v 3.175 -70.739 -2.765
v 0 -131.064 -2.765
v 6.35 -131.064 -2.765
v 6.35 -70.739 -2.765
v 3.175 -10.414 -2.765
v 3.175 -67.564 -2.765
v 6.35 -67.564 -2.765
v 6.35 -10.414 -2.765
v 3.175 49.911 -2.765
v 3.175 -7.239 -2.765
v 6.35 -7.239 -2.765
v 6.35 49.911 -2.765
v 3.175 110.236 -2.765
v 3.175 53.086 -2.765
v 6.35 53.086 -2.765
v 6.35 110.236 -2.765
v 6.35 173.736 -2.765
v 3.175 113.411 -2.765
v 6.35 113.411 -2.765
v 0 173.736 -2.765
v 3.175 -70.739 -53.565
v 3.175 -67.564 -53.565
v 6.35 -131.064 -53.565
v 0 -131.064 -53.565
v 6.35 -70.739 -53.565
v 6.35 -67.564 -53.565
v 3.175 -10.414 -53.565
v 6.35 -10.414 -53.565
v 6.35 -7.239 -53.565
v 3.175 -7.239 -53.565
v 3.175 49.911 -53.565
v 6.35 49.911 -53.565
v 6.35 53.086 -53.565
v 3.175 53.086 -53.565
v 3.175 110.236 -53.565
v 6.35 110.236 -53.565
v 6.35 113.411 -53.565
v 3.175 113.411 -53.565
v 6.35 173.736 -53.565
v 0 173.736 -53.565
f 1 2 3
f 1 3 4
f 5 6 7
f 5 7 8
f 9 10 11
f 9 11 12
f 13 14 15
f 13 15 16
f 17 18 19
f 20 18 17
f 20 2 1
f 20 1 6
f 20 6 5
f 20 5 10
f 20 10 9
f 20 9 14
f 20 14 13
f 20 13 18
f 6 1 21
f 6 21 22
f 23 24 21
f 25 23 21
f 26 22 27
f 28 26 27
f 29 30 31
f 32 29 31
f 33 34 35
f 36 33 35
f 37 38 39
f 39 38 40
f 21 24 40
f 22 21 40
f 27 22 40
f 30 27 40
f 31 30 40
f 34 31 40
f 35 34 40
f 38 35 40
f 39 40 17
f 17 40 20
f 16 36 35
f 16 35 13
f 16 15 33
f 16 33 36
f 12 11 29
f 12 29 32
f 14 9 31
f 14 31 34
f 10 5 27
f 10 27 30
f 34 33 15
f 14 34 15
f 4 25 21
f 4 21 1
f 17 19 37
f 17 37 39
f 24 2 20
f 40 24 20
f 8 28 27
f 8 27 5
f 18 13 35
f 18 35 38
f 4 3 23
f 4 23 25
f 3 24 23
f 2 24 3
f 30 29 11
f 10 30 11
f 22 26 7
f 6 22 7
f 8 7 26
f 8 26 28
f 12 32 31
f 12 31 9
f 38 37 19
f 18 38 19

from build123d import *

# Parameters (mm, degrees)
F0_W     = 304.8
F0_H     = 50.8
F1_DEPTH = 6.35
F2_W     = 3.175
F2_H     = 50.8
F3_DEPTH = 3.175


with BuildPart() as f1:
    # F0 (on Right) → F1 (new body)
    with BuildSketch(Plane.YZ):
        with Locations((21.336002, -28.165208)):
            Rectangle(F0_W, F0_H)
    extrude(amount=F1_DEPTH)

    # F2 (on face) → F3 (cut)
    with BuildSketch(Plane.YZ.offset(6.35)):
        with Locations((-69.151498, -28.165208)):
            Rectangle(F2_W, F2_H)
        with Locations((-8.826498, -28.165208)):
            Rectangle(F2_W, F2_H)
        with Locations((51.498502, -28.165208)):
            Rectangle(F2_W, F2_H)
        with Locations((111.823502, -28.165208)):
            Rectangle(F2_W, F2_H)
    extrude(amount=-F3_DEPTH, mode=Mode.SUBTRACT)


solid = f1.part
